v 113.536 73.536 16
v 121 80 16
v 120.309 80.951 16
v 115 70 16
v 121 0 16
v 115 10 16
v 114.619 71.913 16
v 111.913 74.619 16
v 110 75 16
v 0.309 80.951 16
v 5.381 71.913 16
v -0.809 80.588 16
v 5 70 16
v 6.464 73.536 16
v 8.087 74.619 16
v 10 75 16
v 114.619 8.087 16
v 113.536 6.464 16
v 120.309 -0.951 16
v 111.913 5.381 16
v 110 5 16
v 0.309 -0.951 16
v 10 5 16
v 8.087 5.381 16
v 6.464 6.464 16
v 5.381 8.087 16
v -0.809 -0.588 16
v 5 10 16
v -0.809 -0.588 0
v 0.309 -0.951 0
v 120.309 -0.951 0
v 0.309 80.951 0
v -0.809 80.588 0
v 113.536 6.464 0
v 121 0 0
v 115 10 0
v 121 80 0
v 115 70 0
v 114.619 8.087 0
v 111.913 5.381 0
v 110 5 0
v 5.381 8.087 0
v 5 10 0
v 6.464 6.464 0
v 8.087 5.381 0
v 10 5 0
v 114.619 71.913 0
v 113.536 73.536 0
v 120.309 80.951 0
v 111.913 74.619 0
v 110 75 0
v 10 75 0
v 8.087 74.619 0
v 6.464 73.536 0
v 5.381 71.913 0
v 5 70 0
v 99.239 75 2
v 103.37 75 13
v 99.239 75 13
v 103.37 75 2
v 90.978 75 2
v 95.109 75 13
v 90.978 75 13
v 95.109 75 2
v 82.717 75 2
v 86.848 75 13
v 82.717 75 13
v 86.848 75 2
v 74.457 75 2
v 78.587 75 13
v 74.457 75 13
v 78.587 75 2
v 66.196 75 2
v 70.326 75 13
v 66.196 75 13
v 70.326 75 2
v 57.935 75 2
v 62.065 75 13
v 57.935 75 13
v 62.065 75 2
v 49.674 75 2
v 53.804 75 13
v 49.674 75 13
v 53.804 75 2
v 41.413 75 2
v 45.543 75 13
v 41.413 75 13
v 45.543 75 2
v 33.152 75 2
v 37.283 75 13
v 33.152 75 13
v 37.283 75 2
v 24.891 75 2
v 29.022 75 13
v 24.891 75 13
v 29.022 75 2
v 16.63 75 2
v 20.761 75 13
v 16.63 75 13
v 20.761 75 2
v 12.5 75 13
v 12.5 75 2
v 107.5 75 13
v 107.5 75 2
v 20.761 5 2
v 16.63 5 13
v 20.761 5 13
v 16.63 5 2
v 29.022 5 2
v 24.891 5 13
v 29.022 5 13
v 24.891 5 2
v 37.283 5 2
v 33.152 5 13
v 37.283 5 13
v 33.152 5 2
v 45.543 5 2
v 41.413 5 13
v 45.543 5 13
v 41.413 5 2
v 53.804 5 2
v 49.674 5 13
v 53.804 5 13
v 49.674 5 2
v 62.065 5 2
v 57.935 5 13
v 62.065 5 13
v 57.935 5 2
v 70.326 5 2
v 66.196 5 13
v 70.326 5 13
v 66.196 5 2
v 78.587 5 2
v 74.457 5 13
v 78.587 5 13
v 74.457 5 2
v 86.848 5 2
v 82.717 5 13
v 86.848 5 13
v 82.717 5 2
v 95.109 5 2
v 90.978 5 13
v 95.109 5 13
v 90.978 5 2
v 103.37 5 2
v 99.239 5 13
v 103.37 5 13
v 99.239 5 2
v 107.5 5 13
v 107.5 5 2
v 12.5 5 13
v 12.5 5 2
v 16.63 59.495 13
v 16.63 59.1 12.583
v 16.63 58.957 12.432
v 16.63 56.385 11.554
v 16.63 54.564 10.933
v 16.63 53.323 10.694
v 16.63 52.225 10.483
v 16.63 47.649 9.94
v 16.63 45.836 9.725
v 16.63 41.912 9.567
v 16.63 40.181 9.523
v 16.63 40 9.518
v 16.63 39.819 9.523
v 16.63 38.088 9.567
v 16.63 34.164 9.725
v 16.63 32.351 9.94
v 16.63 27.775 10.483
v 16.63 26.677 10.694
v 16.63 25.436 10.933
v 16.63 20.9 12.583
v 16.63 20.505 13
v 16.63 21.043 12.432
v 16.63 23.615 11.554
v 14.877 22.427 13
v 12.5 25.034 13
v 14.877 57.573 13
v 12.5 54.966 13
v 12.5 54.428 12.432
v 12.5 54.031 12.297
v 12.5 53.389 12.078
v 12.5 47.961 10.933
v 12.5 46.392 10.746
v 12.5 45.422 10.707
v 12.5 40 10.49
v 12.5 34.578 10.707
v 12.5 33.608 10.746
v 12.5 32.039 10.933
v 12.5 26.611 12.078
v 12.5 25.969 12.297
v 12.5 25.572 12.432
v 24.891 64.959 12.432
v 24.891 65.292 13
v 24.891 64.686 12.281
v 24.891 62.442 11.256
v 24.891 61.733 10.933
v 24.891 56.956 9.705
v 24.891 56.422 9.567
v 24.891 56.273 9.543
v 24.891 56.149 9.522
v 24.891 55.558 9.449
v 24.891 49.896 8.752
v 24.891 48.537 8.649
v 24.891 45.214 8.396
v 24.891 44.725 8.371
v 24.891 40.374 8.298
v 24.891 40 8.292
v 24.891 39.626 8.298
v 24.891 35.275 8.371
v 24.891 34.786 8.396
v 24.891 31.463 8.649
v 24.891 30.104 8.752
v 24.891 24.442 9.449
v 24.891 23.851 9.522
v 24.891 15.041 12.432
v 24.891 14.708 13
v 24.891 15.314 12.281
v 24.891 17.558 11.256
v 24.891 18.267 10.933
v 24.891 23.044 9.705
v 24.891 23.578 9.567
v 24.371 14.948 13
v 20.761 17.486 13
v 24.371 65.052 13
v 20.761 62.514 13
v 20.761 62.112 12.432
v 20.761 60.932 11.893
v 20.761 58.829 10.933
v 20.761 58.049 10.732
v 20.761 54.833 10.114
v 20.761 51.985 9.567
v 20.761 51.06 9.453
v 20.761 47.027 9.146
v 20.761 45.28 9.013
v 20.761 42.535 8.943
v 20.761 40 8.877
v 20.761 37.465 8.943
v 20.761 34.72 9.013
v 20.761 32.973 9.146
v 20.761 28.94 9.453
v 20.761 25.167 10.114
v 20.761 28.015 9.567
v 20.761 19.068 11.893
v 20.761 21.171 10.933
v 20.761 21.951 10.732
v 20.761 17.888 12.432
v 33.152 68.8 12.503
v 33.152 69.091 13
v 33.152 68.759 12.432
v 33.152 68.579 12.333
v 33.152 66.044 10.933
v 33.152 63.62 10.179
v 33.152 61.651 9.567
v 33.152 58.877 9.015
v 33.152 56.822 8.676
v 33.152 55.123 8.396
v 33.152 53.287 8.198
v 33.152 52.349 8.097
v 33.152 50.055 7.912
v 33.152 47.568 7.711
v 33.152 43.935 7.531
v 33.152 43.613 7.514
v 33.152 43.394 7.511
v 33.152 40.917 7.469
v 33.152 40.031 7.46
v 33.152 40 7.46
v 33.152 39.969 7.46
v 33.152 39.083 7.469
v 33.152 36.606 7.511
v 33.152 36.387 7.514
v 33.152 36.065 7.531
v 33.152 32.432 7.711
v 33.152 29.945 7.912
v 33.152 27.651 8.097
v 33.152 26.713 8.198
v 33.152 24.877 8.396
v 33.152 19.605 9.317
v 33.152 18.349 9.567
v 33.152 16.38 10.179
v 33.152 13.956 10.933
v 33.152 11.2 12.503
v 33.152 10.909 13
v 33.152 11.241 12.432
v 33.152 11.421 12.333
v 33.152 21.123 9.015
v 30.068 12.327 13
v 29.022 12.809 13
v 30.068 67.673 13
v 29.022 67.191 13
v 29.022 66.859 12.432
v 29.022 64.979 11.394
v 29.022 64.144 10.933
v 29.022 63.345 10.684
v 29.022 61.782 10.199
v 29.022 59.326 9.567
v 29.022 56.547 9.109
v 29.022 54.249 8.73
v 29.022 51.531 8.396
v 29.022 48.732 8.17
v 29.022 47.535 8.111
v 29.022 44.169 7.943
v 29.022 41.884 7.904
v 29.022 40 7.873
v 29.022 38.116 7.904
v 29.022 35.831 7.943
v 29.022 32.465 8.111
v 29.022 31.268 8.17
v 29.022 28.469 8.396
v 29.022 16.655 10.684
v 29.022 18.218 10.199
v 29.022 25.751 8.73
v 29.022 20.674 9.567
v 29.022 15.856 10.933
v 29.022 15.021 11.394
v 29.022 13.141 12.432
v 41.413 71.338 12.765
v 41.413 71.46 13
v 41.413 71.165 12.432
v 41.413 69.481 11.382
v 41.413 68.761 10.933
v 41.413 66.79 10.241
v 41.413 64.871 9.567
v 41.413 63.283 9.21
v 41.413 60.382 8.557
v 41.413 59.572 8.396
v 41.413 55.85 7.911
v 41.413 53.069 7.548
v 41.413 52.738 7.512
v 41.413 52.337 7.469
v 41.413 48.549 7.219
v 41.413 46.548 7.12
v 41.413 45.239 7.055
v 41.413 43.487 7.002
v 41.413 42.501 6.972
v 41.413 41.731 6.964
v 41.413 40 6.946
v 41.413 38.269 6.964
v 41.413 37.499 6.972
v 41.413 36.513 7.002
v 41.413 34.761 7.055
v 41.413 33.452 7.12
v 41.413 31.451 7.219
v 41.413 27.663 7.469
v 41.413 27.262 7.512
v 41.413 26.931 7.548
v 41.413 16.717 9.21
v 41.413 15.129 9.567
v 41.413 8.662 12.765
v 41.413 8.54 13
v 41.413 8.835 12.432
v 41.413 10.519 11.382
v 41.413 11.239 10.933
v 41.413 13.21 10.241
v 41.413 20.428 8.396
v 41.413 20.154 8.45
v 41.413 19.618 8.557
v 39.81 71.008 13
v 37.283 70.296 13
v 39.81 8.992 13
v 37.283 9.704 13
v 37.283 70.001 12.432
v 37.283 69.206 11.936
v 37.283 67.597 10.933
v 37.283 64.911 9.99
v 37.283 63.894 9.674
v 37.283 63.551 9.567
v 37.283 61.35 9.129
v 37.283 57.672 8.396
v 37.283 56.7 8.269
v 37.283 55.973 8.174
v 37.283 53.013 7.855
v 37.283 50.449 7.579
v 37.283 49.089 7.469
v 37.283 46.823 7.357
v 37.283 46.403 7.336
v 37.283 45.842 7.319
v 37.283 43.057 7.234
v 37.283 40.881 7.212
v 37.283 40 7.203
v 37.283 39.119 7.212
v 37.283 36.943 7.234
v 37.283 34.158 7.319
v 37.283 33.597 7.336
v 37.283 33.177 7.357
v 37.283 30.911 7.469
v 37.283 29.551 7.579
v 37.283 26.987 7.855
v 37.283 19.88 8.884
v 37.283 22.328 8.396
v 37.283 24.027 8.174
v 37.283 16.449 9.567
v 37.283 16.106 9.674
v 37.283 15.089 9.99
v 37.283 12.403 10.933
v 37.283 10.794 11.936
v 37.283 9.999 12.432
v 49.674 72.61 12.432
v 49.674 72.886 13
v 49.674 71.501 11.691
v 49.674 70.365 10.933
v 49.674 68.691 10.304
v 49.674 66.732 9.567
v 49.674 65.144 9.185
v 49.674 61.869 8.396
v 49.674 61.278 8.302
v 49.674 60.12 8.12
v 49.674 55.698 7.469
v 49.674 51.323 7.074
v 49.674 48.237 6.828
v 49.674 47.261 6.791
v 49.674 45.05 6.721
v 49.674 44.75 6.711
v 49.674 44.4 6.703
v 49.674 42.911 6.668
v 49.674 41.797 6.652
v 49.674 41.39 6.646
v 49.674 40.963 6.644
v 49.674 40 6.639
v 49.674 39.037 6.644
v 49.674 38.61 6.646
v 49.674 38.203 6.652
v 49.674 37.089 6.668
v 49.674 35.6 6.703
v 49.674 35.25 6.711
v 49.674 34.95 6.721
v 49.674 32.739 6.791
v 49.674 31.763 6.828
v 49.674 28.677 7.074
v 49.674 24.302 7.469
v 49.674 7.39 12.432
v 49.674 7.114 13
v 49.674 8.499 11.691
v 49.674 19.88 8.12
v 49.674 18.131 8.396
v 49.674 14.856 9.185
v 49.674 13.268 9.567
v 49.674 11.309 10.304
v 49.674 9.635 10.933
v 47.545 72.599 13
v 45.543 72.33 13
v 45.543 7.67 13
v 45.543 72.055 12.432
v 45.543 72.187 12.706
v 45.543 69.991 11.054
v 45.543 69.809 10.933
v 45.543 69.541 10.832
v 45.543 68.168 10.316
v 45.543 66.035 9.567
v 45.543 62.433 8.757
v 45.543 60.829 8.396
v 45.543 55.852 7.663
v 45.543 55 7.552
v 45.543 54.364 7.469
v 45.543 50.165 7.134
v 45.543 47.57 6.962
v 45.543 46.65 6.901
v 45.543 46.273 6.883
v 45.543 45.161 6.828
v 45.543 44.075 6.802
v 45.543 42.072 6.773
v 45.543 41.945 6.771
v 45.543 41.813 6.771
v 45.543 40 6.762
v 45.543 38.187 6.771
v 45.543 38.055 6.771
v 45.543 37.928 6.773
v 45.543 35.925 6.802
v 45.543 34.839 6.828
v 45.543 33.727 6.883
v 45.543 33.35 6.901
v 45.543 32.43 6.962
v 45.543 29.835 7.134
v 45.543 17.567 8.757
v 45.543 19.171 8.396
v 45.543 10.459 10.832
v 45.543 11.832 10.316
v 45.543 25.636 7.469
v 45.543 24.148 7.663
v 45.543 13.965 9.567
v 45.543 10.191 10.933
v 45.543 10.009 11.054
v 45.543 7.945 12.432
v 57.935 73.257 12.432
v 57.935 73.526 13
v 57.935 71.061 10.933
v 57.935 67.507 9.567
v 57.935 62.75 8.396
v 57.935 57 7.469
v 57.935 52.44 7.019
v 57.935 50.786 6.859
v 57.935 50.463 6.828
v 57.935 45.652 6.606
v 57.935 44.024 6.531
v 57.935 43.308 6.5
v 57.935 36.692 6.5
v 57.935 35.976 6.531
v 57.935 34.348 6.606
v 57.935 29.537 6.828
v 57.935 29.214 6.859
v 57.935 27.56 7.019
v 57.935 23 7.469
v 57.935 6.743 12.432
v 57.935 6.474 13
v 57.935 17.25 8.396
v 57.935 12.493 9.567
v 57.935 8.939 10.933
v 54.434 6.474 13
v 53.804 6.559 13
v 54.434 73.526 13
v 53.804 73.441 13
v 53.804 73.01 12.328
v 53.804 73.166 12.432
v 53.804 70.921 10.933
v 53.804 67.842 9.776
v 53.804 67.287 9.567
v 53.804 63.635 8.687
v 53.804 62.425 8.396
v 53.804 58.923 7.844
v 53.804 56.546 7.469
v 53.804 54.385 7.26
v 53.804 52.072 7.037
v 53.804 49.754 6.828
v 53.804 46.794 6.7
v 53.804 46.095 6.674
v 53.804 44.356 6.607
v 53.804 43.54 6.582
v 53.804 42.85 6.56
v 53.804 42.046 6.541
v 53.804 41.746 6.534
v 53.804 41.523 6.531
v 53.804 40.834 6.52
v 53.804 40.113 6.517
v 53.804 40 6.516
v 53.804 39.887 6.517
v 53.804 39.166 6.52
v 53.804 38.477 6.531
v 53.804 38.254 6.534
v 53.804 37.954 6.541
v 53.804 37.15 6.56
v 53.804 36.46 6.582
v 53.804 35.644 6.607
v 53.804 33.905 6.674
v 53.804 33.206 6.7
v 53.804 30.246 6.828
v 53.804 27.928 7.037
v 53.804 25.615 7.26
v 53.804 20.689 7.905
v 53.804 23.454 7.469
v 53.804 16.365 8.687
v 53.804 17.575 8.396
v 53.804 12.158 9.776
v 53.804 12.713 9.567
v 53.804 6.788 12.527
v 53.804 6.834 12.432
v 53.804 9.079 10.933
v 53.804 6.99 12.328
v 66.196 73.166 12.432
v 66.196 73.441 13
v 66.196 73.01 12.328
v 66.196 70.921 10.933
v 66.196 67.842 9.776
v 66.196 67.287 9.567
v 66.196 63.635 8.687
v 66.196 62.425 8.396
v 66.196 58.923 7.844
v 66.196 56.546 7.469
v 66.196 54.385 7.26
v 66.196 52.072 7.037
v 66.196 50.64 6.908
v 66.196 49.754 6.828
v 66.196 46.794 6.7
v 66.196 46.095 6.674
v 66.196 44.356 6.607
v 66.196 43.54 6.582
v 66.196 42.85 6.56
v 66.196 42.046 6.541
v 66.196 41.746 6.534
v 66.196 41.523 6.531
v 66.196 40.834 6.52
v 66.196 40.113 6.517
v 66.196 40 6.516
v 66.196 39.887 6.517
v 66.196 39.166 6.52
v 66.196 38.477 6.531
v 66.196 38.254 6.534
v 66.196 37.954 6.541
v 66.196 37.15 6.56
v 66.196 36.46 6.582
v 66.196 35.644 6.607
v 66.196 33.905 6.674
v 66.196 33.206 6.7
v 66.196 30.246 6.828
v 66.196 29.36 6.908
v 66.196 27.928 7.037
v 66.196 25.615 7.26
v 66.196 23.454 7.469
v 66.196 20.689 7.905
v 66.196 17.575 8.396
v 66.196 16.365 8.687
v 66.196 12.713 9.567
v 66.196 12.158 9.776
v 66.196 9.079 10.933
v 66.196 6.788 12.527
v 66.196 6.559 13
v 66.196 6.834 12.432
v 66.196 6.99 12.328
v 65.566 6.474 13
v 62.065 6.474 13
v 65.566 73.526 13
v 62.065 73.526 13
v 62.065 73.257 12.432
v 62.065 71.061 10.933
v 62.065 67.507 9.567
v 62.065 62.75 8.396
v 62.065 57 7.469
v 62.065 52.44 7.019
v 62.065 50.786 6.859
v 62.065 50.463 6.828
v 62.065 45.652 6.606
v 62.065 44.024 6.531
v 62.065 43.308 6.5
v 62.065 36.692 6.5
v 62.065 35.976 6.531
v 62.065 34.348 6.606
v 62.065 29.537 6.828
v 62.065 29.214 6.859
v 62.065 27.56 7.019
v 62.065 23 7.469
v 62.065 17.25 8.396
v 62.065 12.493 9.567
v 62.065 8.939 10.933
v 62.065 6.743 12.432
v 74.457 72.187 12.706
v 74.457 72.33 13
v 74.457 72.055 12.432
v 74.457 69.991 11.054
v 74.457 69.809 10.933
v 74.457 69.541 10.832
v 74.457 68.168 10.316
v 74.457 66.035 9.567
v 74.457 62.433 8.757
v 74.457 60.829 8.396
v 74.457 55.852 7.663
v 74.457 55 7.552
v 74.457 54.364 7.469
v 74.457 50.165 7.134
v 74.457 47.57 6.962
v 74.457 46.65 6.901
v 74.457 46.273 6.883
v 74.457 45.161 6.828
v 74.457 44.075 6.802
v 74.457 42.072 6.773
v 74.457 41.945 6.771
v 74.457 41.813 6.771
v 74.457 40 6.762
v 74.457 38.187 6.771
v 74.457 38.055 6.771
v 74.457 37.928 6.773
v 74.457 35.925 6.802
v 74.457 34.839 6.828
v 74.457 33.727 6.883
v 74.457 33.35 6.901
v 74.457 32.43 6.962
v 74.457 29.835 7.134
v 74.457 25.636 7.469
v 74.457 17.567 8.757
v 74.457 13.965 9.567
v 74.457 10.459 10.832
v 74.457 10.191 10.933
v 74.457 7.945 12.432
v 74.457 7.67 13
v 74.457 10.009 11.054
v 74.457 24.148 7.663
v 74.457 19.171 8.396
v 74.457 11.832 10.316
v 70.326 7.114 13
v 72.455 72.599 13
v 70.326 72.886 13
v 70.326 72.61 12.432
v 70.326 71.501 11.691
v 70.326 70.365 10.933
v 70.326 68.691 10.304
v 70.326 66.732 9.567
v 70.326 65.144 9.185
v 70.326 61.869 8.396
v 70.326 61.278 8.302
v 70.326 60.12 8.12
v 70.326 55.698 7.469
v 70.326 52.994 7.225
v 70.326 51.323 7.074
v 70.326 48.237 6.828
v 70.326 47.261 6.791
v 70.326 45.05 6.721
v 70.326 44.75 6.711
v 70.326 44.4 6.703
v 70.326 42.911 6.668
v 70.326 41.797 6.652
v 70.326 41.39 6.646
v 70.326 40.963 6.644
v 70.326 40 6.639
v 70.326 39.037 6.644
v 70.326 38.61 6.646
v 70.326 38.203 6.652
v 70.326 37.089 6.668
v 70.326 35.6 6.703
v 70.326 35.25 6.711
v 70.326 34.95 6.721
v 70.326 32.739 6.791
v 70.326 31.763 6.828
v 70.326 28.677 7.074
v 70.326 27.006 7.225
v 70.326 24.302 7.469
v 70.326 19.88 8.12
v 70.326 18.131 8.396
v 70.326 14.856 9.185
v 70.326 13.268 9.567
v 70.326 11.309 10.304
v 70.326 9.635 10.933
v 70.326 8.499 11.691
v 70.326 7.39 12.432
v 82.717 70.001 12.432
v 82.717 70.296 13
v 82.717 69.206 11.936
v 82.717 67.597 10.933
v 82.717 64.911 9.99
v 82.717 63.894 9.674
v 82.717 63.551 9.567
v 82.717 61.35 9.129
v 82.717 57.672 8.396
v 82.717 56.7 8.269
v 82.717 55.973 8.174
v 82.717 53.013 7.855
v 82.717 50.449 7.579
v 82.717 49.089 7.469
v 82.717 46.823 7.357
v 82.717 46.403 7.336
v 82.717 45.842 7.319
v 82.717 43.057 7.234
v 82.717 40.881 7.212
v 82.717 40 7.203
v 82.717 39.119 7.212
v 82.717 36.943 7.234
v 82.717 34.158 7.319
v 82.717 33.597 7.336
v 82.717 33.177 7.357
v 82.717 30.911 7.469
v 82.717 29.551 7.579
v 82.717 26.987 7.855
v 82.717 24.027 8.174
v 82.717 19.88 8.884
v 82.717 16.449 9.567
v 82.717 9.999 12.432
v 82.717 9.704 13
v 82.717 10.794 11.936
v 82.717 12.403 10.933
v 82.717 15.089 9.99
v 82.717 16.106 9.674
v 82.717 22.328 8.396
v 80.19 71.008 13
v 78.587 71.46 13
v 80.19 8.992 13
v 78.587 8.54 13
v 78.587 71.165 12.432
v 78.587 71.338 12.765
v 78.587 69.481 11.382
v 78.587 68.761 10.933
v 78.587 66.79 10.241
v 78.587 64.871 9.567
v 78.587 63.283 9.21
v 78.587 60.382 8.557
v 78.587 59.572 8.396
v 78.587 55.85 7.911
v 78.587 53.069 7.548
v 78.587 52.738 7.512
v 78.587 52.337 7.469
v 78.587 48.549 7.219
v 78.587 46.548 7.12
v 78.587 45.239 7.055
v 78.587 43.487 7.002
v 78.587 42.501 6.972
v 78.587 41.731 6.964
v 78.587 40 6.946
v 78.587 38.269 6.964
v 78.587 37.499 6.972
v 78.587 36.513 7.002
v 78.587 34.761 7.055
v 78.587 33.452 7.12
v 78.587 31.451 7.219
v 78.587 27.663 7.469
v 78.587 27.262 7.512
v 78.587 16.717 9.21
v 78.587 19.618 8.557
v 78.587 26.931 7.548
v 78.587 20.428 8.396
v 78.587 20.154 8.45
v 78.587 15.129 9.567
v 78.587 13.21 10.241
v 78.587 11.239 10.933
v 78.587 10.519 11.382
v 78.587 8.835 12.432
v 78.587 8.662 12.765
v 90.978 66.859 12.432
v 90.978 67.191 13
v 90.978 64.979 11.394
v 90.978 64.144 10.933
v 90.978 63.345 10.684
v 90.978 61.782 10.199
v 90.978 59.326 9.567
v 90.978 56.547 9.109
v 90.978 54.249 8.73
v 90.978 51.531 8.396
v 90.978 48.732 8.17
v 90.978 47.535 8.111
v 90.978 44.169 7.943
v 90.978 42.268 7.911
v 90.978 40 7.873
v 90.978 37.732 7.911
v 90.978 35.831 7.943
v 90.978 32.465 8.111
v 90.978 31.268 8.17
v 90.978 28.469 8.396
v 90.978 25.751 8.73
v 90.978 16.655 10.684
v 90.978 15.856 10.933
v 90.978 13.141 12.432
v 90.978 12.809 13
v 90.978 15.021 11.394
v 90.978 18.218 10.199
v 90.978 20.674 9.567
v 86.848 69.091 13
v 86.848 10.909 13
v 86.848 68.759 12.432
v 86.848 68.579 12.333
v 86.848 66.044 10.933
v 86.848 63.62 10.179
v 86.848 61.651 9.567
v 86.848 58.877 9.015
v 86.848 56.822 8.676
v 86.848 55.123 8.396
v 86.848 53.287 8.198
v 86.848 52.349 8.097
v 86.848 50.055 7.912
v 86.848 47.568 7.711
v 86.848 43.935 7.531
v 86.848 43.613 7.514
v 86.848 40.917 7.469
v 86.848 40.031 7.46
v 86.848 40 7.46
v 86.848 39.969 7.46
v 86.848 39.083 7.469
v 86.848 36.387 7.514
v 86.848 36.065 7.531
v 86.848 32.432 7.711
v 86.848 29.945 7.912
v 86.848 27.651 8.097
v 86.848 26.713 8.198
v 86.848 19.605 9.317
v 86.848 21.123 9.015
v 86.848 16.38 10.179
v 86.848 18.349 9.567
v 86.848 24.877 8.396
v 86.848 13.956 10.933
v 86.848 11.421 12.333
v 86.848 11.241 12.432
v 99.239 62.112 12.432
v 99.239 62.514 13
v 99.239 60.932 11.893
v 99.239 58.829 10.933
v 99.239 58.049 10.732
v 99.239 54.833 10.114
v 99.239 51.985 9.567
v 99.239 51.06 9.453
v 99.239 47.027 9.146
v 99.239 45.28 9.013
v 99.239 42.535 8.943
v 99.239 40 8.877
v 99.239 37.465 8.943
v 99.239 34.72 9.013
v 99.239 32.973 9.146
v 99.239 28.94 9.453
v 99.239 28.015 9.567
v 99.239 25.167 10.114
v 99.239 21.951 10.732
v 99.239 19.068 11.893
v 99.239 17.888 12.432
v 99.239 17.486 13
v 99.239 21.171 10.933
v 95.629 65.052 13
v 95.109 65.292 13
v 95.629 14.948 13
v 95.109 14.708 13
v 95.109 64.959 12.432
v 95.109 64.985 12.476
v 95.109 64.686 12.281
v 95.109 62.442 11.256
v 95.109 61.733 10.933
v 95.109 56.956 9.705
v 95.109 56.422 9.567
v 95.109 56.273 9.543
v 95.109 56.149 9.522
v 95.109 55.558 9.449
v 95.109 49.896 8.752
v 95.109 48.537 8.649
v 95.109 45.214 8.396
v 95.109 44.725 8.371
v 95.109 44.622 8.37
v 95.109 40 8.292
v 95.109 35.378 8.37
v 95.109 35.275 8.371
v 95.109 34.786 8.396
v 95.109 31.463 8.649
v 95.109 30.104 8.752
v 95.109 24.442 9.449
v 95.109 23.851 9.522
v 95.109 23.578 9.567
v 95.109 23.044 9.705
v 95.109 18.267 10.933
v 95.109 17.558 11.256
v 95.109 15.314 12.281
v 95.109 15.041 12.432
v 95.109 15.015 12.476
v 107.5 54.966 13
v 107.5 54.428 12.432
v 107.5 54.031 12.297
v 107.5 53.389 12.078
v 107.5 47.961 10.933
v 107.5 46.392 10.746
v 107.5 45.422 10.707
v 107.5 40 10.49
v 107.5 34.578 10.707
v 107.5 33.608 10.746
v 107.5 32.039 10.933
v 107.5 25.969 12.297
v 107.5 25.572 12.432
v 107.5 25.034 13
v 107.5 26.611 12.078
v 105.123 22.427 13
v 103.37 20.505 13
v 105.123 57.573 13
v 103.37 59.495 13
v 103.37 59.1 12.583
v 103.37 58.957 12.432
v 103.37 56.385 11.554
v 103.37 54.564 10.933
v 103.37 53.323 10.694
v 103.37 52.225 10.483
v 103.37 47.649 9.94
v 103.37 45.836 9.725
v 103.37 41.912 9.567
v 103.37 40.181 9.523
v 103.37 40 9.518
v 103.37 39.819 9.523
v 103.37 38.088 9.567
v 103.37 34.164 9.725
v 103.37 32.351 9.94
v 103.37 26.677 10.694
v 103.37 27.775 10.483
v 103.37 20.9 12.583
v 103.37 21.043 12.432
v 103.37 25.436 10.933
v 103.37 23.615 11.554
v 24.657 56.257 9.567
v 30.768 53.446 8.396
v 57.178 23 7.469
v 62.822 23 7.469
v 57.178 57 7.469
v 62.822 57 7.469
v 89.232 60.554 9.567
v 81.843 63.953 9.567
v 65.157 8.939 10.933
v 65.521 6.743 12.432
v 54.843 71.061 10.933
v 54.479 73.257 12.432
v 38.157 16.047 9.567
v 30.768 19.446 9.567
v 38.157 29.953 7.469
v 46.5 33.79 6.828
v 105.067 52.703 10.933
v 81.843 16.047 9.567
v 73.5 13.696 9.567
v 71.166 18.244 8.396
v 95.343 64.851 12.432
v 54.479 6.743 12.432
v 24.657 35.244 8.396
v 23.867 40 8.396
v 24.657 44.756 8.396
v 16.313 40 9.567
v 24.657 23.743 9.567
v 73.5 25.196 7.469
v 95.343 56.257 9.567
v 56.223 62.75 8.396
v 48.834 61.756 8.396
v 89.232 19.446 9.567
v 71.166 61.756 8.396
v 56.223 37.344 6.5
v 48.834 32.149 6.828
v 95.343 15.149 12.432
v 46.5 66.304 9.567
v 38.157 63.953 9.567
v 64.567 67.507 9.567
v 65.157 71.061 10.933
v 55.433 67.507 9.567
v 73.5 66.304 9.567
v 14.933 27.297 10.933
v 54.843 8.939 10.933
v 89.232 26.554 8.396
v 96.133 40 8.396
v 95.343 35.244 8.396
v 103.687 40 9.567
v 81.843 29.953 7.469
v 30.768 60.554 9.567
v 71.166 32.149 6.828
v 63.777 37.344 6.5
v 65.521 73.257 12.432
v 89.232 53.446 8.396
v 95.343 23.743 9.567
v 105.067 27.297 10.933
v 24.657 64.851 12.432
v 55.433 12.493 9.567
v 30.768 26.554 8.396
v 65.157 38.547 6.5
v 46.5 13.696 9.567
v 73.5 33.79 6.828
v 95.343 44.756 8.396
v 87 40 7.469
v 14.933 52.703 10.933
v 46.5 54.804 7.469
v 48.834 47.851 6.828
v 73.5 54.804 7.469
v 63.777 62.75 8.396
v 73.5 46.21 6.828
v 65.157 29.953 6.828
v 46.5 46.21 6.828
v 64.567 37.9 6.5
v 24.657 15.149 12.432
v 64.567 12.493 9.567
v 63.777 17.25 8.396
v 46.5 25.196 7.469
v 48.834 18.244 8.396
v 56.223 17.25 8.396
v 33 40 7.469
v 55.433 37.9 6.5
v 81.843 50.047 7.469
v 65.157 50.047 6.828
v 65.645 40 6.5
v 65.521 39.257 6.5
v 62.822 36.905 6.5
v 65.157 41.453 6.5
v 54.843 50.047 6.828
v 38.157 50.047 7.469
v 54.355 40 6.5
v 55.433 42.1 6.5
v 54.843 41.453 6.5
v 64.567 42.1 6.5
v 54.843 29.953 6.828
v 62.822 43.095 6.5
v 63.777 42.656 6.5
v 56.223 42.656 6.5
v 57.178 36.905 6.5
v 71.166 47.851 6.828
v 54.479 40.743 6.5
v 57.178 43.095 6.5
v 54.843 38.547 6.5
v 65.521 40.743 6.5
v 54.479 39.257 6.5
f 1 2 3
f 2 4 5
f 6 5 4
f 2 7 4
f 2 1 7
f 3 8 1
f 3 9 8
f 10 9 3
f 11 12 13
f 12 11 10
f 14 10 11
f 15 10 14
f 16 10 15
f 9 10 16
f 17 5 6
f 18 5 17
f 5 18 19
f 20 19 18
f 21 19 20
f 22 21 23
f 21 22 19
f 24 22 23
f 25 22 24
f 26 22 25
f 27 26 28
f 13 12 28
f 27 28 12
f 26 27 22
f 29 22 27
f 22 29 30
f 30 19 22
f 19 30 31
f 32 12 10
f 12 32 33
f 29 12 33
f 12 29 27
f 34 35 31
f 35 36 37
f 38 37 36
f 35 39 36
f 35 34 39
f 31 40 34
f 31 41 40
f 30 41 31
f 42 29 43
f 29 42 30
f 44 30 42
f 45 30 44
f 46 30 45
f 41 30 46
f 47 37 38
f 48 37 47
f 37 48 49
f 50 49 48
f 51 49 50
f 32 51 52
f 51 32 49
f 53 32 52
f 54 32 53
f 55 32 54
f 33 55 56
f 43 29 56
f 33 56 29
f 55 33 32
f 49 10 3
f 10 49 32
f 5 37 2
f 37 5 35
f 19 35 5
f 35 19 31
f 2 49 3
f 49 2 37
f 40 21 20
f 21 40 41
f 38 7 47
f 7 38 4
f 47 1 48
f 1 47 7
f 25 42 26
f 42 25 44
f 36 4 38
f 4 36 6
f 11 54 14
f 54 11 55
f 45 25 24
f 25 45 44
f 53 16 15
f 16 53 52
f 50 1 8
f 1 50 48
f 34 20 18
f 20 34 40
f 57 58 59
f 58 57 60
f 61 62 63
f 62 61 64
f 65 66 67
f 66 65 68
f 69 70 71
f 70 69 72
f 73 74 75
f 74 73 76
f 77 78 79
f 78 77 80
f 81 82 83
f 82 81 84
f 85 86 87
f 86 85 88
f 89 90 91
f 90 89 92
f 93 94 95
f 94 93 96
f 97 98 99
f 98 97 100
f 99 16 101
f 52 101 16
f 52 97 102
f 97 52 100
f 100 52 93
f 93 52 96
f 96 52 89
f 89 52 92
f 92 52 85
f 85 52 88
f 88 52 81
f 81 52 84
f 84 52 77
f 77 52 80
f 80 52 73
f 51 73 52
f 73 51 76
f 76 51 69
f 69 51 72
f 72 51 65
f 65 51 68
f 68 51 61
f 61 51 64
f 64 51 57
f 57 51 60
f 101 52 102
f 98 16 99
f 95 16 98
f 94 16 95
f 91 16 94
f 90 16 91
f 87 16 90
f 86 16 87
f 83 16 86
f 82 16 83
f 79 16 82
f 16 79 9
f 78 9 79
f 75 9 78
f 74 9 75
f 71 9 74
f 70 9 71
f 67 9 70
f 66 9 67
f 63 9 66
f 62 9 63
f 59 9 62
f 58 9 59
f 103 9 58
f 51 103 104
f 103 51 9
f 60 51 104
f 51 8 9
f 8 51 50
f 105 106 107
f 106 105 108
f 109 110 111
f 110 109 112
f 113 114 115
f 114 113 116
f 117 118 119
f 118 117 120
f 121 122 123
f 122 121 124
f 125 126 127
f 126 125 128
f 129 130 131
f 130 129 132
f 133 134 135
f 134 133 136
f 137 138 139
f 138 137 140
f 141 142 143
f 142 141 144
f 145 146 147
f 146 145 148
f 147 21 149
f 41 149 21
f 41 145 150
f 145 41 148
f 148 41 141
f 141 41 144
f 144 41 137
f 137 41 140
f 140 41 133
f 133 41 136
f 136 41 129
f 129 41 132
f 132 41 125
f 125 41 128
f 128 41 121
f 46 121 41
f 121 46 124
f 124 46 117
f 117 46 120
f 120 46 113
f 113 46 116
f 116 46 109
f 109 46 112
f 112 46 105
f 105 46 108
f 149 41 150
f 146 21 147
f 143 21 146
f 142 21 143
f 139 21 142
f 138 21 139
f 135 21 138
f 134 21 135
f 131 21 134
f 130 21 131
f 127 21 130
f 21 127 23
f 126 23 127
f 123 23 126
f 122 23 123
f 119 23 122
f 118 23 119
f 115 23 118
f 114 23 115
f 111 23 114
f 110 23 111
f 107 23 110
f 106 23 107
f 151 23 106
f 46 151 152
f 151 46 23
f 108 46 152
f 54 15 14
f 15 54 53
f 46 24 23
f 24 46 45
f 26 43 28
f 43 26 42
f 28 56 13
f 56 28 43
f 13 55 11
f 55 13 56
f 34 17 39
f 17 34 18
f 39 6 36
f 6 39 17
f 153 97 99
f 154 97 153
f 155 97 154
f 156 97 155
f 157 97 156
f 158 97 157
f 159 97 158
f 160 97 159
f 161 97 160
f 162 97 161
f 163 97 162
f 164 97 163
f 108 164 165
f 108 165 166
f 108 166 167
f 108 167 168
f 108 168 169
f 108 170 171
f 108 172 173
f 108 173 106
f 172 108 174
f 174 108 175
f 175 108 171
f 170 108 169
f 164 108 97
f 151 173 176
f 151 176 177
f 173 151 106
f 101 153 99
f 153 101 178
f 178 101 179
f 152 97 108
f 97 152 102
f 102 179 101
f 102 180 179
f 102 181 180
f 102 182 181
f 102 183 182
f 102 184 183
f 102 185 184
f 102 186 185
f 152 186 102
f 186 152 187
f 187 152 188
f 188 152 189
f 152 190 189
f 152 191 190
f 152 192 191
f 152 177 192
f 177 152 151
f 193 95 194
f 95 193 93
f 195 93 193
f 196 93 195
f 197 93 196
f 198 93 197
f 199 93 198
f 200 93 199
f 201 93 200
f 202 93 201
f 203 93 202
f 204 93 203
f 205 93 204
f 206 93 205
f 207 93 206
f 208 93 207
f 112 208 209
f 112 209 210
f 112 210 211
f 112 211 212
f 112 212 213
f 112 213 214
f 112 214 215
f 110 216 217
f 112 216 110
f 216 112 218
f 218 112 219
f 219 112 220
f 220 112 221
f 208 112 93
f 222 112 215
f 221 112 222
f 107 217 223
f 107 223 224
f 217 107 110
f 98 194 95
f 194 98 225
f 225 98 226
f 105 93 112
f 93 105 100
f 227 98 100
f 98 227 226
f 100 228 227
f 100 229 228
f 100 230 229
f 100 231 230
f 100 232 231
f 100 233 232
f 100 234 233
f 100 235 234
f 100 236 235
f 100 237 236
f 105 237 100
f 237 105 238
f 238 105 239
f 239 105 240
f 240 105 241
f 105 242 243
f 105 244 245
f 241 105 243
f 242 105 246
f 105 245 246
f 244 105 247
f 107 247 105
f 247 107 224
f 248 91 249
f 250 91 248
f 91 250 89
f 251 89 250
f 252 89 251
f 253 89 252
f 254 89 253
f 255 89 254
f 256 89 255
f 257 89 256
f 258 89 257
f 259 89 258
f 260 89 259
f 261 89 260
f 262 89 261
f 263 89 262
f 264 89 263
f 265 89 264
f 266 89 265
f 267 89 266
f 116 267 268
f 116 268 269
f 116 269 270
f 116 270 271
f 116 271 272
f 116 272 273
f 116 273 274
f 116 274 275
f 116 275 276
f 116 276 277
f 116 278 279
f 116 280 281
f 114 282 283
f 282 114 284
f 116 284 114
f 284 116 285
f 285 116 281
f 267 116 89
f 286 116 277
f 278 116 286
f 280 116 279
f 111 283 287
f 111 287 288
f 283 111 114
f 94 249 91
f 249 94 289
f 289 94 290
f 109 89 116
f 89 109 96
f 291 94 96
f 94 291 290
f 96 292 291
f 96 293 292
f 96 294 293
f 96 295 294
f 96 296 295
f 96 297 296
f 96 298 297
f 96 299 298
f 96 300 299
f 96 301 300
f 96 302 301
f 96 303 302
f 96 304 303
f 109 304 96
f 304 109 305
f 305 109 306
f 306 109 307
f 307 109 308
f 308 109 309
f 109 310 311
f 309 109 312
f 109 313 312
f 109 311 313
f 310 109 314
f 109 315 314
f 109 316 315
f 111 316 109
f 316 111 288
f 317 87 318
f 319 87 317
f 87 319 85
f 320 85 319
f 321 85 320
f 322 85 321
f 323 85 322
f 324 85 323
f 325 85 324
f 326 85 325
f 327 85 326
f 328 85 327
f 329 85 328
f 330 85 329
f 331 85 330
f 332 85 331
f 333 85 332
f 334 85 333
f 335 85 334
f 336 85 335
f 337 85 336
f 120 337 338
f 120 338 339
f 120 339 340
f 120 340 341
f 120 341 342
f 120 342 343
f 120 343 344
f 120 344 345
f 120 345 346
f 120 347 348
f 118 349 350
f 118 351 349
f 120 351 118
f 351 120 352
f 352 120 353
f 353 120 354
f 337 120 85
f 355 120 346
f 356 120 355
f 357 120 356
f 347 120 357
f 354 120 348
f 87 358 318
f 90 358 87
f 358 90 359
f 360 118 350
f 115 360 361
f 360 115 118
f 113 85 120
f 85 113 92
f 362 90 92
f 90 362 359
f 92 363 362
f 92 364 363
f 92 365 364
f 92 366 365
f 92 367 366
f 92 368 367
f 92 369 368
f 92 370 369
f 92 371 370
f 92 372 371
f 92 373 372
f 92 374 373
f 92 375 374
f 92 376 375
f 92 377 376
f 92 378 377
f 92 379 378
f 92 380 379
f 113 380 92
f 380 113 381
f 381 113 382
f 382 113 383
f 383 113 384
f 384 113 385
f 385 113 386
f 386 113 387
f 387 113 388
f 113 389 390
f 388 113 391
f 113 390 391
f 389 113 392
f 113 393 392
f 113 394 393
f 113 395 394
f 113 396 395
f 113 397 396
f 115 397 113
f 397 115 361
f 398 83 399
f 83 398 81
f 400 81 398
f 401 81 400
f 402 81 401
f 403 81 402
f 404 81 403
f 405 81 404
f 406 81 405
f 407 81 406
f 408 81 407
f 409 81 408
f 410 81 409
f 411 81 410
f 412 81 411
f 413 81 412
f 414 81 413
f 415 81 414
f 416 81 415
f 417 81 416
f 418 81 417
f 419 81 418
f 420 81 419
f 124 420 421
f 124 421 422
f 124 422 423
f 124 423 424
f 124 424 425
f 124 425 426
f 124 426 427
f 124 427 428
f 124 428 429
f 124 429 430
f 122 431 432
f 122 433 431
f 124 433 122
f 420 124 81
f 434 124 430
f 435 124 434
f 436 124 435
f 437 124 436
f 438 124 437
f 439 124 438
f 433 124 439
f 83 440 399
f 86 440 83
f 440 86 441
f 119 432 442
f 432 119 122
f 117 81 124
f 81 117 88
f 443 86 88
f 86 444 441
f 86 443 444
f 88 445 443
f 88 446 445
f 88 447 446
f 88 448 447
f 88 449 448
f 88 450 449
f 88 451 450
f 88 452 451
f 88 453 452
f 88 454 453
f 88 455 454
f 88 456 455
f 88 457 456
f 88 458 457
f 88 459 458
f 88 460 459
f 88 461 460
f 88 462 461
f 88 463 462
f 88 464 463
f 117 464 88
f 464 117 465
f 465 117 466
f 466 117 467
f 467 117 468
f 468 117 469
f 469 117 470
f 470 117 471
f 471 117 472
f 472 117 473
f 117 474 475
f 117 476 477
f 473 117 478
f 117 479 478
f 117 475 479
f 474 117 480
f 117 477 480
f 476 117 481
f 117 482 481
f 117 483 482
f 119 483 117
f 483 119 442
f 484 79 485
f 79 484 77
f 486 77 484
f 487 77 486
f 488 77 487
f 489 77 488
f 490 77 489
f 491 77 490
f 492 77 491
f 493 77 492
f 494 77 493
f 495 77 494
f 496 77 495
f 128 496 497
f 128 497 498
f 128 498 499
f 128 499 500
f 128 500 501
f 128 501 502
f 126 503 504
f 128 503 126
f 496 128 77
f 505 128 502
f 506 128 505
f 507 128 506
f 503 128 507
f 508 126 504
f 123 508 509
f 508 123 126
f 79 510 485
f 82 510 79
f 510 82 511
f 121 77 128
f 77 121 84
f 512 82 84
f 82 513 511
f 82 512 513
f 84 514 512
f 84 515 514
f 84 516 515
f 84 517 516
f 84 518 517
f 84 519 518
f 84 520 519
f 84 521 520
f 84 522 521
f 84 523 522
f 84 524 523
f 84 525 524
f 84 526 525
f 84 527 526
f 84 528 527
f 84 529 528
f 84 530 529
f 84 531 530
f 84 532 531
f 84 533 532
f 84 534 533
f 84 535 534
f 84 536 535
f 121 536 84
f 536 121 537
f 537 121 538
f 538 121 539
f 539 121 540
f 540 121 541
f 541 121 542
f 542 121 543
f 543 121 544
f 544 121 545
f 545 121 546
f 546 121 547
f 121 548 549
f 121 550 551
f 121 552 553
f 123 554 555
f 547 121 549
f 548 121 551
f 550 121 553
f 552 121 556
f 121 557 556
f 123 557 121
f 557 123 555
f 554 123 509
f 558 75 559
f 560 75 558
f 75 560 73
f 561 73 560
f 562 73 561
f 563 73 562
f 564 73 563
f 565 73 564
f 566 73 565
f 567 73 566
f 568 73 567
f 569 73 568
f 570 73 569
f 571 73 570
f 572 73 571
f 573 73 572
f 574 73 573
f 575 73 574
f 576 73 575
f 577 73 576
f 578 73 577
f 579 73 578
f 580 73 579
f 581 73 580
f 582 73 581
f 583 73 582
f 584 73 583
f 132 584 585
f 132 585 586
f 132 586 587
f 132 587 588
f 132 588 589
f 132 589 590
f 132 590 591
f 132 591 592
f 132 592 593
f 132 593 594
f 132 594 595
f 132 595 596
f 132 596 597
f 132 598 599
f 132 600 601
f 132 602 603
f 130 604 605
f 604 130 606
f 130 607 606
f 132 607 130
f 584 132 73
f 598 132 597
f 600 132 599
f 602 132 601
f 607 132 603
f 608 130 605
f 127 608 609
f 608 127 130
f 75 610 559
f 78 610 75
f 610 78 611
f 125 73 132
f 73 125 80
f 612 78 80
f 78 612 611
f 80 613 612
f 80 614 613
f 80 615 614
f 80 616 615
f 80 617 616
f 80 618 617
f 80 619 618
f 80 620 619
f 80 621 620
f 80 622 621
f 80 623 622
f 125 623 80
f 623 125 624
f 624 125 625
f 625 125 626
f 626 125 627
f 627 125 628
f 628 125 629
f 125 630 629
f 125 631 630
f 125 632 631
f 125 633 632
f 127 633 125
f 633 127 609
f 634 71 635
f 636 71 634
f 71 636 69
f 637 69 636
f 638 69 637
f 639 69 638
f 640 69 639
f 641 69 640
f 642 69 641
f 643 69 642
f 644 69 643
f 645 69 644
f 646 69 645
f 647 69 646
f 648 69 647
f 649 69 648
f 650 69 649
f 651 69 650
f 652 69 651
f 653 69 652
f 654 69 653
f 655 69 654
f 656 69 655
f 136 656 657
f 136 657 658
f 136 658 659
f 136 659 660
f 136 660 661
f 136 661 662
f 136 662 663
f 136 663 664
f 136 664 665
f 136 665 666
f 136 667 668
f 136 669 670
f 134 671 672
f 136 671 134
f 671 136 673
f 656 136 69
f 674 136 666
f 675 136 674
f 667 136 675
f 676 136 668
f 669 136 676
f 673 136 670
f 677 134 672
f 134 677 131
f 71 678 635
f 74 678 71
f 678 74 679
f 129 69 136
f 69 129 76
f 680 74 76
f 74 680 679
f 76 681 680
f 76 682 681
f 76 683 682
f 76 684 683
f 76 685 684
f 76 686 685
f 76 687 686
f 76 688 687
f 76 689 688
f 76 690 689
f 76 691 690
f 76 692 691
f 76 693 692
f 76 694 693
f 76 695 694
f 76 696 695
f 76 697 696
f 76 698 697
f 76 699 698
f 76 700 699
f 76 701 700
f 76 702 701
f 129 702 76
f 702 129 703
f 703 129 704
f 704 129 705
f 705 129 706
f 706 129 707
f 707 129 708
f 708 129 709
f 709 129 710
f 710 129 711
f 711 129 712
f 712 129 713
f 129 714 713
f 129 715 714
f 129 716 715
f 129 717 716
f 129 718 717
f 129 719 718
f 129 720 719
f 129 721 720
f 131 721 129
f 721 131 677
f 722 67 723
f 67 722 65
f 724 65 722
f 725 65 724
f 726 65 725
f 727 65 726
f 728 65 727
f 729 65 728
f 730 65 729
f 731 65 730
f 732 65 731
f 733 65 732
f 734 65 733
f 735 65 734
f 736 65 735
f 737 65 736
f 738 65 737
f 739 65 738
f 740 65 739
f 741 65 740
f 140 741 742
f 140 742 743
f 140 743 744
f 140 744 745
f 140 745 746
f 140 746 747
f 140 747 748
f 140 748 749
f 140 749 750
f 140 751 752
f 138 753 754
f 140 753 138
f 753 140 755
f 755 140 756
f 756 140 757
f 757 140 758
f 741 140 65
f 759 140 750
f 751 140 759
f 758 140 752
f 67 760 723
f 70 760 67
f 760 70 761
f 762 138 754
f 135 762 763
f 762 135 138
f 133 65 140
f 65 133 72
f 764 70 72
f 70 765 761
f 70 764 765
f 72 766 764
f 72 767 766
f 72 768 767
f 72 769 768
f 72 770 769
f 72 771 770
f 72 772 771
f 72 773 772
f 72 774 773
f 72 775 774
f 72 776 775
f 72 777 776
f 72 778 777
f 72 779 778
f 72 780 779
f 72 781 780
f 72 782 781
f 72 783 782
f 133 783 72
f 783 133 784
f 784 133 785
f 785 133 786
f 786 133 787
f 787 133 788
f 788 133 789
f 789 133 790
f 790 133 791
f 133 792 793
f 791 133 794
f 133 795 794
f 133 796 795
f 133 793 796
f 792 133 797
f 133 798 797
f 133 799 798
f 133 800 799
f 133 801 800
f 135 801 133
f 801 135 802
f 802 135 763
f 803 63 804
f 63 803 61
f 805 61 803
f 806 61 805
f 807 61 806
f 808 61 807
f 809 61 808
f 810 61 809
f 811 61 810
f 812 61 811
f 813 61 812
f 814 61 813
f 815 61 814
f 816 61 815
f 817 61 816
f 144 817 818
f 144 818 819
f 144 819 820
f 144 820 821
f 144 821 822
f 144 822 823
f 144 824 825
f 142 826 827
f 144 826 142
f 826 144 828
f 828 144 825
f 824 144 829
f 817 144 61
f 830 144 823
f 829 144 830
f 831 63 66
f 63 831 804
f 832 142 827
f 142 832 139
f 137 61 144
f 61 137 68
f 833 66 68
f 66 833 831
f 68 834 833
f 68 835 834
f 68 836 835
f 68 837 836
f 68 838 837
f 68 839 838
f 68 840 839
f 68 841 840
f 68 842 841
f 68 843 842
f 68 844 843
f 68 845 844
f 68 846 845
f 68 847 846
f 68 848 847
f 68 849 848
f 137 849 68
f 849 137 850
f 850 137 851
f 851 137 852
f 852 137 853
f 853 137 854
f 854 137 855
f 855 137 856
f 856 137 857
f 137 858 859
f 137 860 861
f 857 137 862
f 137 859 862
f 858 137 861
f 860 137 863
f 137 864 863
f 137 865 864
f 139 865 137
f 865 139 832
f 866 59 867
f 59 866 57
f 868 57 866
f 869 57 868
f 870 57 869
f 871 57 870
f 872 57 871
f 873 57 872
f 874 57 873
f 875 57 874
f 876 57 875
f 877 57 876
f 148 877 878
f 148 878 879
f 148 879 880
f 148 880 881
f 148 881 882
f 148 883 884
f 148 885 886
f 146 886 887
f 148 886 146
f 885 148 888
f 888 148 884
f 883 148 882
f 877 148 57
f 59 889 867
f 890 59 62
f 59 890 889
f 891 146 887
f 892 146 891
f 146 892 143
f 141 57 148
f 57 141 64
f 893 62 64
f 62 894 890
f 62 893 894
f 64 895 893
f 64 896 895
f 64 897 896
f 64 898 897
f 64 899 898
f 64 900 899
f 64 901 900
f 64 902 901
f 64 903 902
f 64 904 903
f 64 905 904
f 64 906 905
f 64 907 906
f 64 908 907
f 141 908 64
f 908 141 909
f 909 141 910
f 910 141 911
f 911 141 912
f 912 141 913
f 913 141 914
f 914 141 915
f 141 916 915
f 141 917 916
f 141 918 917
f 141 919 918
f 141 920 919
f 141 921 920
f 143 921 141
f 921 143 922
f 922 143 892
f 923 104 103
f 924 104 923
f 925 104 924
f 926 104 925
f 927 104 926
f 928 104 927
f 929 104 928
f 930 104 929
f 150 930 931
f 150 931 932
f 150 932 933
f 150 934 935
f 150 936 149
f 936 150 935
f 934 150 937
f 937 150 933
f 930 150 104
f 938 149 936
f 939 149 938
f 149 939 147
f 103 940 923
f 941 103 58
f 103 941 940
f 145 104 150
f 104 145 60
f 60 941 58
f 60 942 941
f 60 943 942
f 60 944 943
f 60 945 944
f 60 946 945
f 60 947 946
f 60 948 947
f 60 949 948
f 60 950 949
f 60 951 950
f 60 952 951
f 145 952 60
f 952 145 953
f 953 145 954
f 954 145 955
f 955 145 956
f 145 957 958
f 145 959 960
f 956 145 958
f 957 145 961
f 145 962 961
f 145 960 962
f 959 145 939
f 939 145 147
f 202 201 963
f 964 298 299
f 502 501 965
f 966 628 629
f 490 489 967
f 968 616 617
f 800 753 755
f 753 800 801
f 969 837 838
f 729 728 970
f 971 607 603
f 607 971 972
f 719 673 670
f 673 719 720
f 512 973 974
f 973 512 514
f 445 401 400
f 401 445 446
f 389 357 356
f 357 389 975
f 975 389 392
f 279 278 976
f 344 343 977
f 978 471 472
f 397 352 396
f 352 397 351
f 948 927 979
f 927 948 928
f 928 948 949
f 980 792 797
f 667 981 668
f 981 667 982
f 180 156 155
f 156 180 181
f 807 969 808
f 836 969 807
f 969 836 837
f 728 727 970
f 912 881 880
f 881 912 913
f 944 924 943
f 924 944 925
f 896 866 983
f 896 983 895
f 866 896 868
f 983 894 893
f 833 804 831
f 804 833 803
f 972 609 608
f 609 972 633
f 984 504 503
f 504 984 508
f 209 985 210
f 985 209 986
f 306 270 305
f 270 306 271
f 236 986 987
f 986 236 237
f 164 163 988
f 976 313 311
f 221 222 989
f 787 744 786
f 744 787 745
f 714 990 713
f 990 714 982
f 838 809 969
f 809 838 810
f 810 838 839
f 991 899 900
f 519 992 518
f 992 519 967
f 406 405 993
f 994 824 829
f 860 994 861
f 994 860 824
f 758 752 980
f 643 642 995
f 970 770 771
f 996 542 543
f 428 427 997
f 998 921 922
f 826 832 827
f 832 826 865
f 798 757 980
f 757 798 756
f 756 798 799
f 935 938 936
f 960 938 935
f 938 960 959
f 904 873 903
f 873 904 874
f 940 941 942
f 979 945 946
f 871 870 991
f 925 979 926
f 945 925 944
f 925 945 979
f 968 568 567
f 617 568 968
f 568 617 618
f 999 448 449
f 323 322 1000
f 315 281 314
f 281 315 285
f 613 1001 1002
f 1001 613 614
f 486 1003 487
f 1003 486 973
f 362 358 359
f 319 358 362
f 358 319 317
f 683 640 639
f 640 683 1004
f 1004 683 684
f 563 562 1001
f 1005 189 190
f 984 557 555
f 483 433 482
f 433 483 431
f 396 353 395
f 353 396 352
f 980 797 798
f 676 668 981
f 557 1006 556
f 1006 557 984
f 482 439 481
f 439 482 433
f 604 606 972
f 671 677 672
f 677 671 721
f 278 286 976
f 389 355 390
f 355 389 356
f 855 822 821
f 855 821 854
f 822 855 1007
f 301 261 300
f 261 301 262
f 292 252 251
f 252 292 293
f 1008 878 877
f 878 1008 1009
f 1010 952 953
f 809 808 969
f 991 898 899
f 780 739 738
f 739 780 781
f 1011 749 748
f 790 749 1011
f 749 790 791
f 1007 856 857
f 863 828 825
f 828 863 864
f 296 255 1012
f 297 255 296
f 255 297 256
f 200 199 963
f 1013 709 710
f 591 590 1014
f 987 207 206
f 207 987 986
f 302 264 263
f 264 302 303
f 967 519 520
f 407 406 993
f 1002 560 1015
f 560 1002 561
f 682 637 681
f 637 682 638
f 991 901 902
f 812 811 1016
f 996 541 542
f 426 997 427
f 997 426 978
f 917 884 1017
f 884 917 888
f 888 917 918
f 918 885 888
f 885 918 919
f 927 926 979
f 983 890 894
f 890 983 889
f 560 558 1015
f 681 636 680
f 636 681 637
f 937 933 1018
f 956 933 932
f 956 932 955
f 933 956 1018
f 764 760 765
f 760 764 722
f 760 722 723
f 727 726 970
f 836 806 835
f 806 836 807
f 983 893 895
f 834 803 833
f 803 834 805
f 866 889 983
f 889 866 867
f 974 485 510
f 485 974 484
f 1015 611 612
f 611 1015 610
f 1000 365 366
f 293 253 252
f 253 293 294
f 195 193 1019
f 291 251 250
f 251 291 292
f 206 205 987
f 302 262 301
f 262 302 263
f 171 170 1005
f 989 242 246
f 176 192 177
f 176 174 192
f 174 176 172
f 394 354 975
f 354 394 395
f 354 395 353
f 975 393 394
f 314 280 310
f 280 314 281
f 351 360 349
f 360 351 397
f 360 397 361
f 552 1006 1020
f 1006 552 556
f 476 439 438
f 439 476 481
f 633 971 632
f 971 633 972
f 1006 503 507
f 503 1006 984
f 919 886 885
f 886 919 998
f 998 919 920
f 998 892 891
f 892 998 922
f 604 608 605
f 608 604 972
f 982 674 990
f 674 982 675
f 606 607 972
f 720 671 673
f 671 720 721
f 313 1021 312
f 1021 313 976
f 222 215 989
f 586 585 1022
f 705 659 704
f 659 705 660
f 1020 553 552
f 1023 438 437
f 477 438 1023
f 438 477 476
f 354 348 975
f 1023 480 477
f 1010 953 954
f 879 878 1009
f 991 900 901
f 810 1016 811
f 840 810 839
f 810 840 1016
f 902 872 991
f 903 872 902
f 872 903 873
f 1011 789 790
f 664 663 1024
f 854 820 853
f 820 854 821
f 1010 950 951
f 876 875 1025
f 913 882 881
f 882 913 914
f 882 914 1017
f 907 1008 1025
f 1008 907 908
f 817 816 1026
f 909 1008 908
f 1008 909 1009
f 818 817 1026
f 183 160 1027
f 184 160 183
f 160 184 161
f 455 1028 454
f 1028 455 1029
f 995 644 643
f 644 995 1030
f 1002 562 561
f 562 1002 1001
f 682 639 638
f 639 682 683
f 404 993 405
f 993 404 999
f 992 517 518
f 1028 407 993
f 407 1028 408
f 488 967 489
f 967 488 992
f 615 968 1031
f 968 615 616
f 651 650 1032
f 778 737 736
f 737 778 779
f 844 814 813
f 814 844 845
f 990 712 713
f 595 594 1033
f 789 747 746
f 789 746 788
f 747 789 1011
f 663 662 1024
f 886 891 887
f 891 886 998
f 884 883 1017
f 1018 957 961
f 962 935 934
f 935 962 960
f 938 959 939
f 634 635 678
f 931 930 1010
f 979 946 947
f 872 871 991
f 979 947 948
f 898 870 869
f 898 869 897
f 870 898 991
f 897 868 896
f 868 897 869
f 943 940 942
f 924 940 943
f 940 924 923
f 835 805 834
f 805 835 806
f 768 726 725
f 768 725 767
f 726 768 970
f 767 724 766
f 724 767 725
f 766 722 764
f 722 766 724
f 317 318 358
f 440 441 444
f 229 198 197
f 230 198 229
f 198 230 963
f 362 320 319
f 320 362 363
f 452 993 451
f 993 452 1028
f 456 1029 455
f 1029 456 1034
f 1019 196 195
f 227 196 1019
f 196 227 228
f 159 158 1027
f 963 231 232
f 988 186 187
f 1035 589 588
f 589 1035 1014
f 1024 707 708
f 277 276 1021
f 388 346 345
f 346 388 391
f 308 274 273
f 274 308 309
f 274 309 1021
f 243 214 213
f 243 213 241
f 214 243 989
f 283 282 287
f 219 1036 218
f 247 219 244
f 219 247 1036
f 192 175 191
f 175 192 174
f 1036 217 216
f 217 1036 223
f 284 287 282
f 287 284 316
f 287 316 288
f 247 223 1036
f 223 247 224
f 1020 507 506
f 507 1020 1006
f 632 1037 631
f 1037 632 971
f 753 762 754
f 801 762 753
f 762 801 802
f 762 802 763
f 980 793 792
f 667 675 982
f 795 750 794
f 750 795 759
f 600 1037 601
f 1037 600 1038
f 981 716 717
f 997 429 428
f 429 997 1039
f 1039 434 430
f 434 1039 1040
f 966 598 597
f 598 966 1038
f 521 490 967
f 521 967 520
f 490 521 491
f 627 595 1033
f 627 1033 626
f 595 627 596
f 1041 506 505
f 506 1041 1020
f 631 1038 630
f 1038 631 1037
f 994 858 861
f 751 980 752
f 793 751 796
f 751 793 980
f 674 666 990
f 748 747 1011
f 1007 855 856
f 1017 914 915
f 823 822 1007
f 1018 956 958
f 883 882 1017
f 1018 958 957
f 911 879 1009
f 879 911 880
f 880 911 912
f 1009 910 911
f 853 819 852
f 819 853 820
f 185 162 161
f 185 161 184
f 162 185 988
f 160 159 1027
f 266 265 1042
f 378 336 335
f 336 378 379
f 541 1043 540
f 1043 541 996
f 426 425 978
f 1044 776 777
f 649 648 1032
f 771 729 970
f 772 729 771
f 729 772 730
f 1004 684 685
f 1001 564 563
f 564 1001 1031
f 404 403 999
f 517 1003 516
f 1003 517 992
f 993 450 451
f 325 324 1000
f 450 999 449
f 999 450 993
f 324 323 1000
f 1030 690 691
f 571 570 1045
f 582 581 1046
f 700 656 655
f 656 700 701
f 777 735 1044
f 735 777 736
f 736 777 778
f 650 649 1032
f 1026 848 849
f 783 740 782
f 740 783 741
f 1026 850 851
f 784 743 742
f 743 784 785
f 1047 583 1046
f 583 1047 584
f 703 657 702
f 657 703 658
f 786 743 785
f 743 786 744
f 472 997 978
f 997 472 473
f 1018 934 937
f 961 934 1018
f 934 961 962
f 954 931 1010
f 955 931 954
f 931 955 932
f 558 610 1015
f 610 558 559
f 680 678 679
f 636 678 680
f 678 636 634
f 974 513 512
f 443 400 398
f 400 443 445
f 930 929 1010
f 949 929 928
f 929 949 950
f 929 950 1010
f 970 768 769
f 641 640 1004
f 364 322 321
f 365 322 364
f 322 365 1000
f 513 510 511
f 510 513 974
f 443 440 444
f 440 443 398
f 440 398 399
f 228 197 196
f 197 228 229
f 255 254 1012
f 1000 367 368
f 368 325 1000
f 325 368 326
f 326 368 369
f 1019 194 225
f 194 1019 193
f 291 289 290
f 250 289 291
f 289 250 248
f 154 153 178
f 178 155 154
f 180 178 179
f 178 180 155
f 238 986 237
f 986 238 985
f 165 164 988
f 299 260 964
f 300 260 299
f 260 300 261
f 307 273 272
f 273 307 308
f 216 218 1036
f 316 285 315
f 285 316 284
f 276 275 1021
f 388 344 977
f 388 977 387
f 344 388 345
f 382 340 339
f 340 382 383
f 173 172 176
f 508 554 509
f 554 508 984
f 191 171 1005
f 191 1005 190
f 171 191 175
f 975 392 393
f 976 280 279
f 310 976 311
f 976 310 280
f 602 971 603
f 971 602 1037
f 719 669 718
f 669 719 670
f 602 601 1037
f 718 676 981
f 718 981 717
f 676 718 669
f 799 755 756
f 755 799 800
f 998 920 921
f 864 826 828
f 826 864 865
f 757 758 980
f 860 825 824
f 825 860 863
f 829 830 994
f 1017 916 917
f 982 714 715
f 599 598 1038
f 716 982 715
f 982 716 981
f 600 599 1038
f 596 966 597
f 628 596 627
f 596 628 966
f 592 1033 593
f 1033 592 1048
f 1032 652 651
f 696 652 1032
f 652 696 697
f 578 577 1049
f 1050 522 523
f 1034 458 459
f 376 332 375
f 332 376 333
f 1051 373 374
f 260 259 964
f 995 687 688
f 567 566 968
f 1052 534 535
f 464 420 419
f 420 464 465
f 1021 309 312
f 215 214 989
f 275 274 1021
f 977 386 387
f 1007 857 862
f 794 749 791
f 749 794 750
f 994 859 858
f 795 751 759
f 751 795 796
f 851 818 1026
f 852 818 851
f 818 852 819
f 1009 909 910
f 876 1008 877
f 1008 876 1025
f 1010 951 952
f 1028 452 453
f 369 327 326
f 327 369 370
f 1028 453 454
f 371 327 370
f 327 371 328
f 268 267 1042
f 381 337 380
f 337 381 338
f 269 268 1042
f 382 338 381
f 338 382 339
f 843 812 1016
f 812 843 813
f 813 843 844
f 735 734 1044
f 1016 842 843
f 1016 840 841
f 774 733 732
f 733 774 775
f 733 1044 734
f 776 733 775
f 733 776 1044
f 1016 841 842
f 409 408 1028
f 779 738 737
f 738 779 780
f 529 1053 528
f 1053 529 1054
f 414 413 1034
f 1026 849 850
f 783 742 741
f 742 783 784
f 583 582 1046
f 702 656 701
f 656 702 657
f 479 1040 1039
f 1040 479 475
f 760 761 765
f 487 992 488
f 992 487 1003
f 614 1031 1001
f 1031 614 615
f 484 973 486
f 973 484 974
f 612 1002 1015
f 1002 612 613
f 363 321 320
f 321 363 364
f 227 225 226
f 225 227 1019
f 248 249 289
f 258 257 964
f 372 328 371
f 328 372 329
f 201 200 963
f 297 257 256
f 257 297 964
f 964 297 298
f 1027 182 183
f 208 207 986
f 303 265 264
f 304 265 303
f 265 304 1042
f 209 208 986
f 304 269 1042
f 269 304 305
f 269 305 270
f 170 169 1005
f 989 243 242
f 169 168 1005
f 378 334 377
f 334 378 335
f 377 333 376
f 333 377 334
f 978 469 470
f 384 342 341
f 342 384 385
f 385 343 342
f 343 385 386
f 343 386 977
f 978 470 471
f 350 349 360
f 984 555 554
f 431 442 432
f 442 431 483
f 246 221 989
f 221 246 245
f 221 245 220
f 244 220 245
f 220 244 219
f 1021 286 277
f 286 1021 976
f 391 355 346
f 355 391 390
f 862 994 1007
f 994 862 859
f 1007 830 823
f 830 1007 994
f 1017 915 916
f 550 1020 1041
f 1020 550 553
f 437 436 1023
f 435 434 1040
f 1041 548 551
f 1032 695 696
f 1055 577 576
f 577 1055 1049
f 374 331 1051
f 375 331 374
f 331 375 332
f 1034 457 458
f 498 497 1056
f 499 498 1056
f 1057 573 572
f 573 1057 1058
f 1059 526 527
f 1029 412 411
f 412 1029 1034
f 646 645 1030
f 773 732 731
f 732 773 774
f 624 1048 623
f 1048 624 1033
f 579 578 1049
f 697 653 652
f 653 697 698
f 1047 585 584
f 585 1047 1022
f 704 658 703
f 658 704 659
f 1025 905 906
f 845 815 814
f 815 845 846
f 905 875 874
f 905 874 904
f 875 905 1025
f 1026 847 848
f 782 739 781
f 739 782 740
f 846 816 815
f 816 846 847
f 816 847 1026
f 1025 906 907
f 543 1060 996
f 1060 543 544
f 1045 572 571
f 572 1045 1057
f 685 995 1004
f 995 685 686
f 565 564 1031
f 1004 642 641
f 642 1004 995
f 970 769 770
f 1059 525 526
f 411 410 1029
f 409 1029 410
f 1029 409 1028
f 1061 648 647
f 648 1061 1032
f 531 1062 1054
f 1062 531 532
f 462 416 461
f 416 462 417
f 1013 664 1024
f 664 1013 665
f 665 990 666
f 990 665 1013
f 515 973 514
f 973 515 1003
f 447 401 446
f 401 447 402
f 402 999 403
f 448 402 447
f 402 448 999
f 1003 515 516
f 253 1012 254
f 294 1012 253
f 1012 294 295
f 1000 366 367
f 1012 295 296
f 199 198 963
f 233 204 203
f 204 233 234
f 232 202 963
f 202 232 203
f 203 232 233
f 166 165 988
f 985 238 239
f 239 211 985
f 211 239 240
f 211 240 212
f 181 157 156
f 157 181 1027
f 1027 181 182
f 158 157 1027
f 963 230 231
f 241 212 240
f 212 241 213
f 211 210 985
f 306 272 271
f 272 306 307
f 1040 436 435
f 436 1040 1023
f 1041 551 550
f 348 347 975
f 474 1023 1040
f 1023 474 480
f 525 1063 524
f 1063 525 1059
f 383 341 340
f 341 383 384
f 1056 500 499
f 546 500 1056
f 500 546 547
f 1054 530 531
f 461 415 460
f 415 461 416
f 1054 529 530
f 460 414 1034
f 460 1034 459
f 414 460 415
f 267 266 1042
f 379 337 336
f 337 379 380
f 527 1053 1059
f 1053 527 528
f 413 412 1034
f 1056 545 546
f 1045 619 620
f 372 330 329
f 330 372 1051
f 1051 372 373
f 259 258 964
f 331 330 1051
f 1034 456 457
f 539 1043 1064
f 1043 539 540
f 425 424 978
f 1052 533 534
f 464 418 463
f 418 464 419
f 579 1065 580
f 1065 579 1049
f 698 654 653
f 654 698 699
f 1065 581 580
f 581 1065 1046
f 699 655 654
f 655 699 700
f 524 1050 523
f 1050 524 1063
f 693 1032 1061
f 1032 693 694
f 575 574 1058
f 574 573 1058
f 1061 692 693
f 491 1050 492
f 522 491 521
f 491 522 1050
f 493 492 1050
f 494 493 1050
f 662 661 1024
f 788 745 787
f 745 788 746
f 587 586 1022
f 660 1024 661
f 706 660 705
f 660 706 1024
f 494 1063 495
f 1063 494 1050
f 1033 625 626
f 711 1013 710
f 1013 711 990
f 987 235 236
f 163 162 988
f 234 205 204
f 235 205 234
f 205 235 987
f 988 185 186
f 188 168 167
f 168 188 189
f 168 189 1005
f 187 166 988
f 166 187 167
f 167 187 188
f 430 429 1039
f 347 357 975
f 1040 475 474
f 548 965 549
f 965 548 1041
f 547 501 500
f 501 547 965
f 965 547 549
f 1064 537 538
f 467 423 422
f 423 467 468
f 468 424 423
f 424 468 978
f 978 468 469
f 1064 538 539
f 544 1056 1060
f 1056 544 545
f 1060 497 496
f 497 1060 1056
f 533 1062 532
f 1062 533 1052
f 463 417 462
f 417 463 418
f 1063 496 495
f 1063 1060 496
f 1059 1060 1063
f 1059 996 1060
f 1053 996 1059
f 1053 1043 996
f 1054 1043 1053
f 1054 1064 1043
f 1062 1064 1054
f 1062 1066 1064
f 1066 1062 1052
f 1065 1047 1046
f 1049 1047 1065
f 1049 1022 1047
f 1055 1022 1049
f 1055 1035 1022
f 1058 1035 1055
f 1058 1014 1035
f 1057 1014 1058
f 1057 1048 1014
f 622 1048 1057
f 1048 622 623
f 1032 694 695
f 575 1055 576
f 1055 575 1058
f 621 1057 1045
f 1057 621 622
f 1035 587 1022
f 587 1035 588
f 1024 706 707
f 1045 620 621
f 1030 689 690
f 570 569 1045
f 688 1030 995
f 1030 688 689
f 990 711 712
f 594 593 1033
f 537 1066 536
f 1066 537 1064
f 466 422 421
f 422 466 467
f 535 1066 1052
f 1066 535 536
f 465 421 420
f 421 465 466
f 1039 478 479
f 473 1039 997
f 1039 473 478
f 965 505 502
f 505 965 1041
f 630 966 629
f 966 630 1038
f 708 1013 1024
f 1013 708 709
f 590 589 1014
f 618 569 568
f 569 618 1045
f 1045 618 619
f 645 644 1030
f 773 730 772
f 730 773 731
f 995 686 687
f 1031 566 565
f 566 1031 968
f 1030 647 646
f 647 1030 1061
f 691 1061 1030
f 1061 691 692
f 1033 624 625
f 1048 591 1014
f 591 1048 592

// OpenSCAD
module rounded_base_box(x, y, z, rounding) {
	minkowski() {
 		cube([x,y,z]);
 		cylinder(r=rounding,h=rounding);
	}
}

module soaptray(x, y, z, thicknessFrame, totalbars) {
	echo("rendering a soapbox with x=", x, " and y=", y);

   lower = 2;
   
	rounding = (thicknessFrame/2);
	beginBars = (rounding/2) + thicknessFrame;
   barWidth = (x - (2*beginBars))/((totalbars*2)-1);
	echo("beginBars:", beginBars);
   echo("barWidth:", barWidth);

   countBars = (x-(2*beginBars))/((barWidth*2));
	
   union() {
	difference(){
		rounded_base_box(x, y, z);
   	translate([thicknessFrame, thicknessFrame, 0]) {
			rounded_base_box(x-(thicknessFrame*2), y-(thicknessFrame*2), z, rounding);
		}
	}
   
   difference() {
       for(i = [0 : countBars]) {
		     translate([(barWidth*i*2)+beginBars, 0, lower]) 
			  cube([barWidth, y, z-(2*lower)]);
	    }
       //recess
       translate([(x/2),(y/2),thicknessFrame+(lower*2)]) 
           resize(newsize=[x-thicknessFrame-lower, y-thicknessFrame-lower, z]) 
               sphere(r=100);	
   }
   }
}


soaptray(120, 80, 15, 10, 12);
